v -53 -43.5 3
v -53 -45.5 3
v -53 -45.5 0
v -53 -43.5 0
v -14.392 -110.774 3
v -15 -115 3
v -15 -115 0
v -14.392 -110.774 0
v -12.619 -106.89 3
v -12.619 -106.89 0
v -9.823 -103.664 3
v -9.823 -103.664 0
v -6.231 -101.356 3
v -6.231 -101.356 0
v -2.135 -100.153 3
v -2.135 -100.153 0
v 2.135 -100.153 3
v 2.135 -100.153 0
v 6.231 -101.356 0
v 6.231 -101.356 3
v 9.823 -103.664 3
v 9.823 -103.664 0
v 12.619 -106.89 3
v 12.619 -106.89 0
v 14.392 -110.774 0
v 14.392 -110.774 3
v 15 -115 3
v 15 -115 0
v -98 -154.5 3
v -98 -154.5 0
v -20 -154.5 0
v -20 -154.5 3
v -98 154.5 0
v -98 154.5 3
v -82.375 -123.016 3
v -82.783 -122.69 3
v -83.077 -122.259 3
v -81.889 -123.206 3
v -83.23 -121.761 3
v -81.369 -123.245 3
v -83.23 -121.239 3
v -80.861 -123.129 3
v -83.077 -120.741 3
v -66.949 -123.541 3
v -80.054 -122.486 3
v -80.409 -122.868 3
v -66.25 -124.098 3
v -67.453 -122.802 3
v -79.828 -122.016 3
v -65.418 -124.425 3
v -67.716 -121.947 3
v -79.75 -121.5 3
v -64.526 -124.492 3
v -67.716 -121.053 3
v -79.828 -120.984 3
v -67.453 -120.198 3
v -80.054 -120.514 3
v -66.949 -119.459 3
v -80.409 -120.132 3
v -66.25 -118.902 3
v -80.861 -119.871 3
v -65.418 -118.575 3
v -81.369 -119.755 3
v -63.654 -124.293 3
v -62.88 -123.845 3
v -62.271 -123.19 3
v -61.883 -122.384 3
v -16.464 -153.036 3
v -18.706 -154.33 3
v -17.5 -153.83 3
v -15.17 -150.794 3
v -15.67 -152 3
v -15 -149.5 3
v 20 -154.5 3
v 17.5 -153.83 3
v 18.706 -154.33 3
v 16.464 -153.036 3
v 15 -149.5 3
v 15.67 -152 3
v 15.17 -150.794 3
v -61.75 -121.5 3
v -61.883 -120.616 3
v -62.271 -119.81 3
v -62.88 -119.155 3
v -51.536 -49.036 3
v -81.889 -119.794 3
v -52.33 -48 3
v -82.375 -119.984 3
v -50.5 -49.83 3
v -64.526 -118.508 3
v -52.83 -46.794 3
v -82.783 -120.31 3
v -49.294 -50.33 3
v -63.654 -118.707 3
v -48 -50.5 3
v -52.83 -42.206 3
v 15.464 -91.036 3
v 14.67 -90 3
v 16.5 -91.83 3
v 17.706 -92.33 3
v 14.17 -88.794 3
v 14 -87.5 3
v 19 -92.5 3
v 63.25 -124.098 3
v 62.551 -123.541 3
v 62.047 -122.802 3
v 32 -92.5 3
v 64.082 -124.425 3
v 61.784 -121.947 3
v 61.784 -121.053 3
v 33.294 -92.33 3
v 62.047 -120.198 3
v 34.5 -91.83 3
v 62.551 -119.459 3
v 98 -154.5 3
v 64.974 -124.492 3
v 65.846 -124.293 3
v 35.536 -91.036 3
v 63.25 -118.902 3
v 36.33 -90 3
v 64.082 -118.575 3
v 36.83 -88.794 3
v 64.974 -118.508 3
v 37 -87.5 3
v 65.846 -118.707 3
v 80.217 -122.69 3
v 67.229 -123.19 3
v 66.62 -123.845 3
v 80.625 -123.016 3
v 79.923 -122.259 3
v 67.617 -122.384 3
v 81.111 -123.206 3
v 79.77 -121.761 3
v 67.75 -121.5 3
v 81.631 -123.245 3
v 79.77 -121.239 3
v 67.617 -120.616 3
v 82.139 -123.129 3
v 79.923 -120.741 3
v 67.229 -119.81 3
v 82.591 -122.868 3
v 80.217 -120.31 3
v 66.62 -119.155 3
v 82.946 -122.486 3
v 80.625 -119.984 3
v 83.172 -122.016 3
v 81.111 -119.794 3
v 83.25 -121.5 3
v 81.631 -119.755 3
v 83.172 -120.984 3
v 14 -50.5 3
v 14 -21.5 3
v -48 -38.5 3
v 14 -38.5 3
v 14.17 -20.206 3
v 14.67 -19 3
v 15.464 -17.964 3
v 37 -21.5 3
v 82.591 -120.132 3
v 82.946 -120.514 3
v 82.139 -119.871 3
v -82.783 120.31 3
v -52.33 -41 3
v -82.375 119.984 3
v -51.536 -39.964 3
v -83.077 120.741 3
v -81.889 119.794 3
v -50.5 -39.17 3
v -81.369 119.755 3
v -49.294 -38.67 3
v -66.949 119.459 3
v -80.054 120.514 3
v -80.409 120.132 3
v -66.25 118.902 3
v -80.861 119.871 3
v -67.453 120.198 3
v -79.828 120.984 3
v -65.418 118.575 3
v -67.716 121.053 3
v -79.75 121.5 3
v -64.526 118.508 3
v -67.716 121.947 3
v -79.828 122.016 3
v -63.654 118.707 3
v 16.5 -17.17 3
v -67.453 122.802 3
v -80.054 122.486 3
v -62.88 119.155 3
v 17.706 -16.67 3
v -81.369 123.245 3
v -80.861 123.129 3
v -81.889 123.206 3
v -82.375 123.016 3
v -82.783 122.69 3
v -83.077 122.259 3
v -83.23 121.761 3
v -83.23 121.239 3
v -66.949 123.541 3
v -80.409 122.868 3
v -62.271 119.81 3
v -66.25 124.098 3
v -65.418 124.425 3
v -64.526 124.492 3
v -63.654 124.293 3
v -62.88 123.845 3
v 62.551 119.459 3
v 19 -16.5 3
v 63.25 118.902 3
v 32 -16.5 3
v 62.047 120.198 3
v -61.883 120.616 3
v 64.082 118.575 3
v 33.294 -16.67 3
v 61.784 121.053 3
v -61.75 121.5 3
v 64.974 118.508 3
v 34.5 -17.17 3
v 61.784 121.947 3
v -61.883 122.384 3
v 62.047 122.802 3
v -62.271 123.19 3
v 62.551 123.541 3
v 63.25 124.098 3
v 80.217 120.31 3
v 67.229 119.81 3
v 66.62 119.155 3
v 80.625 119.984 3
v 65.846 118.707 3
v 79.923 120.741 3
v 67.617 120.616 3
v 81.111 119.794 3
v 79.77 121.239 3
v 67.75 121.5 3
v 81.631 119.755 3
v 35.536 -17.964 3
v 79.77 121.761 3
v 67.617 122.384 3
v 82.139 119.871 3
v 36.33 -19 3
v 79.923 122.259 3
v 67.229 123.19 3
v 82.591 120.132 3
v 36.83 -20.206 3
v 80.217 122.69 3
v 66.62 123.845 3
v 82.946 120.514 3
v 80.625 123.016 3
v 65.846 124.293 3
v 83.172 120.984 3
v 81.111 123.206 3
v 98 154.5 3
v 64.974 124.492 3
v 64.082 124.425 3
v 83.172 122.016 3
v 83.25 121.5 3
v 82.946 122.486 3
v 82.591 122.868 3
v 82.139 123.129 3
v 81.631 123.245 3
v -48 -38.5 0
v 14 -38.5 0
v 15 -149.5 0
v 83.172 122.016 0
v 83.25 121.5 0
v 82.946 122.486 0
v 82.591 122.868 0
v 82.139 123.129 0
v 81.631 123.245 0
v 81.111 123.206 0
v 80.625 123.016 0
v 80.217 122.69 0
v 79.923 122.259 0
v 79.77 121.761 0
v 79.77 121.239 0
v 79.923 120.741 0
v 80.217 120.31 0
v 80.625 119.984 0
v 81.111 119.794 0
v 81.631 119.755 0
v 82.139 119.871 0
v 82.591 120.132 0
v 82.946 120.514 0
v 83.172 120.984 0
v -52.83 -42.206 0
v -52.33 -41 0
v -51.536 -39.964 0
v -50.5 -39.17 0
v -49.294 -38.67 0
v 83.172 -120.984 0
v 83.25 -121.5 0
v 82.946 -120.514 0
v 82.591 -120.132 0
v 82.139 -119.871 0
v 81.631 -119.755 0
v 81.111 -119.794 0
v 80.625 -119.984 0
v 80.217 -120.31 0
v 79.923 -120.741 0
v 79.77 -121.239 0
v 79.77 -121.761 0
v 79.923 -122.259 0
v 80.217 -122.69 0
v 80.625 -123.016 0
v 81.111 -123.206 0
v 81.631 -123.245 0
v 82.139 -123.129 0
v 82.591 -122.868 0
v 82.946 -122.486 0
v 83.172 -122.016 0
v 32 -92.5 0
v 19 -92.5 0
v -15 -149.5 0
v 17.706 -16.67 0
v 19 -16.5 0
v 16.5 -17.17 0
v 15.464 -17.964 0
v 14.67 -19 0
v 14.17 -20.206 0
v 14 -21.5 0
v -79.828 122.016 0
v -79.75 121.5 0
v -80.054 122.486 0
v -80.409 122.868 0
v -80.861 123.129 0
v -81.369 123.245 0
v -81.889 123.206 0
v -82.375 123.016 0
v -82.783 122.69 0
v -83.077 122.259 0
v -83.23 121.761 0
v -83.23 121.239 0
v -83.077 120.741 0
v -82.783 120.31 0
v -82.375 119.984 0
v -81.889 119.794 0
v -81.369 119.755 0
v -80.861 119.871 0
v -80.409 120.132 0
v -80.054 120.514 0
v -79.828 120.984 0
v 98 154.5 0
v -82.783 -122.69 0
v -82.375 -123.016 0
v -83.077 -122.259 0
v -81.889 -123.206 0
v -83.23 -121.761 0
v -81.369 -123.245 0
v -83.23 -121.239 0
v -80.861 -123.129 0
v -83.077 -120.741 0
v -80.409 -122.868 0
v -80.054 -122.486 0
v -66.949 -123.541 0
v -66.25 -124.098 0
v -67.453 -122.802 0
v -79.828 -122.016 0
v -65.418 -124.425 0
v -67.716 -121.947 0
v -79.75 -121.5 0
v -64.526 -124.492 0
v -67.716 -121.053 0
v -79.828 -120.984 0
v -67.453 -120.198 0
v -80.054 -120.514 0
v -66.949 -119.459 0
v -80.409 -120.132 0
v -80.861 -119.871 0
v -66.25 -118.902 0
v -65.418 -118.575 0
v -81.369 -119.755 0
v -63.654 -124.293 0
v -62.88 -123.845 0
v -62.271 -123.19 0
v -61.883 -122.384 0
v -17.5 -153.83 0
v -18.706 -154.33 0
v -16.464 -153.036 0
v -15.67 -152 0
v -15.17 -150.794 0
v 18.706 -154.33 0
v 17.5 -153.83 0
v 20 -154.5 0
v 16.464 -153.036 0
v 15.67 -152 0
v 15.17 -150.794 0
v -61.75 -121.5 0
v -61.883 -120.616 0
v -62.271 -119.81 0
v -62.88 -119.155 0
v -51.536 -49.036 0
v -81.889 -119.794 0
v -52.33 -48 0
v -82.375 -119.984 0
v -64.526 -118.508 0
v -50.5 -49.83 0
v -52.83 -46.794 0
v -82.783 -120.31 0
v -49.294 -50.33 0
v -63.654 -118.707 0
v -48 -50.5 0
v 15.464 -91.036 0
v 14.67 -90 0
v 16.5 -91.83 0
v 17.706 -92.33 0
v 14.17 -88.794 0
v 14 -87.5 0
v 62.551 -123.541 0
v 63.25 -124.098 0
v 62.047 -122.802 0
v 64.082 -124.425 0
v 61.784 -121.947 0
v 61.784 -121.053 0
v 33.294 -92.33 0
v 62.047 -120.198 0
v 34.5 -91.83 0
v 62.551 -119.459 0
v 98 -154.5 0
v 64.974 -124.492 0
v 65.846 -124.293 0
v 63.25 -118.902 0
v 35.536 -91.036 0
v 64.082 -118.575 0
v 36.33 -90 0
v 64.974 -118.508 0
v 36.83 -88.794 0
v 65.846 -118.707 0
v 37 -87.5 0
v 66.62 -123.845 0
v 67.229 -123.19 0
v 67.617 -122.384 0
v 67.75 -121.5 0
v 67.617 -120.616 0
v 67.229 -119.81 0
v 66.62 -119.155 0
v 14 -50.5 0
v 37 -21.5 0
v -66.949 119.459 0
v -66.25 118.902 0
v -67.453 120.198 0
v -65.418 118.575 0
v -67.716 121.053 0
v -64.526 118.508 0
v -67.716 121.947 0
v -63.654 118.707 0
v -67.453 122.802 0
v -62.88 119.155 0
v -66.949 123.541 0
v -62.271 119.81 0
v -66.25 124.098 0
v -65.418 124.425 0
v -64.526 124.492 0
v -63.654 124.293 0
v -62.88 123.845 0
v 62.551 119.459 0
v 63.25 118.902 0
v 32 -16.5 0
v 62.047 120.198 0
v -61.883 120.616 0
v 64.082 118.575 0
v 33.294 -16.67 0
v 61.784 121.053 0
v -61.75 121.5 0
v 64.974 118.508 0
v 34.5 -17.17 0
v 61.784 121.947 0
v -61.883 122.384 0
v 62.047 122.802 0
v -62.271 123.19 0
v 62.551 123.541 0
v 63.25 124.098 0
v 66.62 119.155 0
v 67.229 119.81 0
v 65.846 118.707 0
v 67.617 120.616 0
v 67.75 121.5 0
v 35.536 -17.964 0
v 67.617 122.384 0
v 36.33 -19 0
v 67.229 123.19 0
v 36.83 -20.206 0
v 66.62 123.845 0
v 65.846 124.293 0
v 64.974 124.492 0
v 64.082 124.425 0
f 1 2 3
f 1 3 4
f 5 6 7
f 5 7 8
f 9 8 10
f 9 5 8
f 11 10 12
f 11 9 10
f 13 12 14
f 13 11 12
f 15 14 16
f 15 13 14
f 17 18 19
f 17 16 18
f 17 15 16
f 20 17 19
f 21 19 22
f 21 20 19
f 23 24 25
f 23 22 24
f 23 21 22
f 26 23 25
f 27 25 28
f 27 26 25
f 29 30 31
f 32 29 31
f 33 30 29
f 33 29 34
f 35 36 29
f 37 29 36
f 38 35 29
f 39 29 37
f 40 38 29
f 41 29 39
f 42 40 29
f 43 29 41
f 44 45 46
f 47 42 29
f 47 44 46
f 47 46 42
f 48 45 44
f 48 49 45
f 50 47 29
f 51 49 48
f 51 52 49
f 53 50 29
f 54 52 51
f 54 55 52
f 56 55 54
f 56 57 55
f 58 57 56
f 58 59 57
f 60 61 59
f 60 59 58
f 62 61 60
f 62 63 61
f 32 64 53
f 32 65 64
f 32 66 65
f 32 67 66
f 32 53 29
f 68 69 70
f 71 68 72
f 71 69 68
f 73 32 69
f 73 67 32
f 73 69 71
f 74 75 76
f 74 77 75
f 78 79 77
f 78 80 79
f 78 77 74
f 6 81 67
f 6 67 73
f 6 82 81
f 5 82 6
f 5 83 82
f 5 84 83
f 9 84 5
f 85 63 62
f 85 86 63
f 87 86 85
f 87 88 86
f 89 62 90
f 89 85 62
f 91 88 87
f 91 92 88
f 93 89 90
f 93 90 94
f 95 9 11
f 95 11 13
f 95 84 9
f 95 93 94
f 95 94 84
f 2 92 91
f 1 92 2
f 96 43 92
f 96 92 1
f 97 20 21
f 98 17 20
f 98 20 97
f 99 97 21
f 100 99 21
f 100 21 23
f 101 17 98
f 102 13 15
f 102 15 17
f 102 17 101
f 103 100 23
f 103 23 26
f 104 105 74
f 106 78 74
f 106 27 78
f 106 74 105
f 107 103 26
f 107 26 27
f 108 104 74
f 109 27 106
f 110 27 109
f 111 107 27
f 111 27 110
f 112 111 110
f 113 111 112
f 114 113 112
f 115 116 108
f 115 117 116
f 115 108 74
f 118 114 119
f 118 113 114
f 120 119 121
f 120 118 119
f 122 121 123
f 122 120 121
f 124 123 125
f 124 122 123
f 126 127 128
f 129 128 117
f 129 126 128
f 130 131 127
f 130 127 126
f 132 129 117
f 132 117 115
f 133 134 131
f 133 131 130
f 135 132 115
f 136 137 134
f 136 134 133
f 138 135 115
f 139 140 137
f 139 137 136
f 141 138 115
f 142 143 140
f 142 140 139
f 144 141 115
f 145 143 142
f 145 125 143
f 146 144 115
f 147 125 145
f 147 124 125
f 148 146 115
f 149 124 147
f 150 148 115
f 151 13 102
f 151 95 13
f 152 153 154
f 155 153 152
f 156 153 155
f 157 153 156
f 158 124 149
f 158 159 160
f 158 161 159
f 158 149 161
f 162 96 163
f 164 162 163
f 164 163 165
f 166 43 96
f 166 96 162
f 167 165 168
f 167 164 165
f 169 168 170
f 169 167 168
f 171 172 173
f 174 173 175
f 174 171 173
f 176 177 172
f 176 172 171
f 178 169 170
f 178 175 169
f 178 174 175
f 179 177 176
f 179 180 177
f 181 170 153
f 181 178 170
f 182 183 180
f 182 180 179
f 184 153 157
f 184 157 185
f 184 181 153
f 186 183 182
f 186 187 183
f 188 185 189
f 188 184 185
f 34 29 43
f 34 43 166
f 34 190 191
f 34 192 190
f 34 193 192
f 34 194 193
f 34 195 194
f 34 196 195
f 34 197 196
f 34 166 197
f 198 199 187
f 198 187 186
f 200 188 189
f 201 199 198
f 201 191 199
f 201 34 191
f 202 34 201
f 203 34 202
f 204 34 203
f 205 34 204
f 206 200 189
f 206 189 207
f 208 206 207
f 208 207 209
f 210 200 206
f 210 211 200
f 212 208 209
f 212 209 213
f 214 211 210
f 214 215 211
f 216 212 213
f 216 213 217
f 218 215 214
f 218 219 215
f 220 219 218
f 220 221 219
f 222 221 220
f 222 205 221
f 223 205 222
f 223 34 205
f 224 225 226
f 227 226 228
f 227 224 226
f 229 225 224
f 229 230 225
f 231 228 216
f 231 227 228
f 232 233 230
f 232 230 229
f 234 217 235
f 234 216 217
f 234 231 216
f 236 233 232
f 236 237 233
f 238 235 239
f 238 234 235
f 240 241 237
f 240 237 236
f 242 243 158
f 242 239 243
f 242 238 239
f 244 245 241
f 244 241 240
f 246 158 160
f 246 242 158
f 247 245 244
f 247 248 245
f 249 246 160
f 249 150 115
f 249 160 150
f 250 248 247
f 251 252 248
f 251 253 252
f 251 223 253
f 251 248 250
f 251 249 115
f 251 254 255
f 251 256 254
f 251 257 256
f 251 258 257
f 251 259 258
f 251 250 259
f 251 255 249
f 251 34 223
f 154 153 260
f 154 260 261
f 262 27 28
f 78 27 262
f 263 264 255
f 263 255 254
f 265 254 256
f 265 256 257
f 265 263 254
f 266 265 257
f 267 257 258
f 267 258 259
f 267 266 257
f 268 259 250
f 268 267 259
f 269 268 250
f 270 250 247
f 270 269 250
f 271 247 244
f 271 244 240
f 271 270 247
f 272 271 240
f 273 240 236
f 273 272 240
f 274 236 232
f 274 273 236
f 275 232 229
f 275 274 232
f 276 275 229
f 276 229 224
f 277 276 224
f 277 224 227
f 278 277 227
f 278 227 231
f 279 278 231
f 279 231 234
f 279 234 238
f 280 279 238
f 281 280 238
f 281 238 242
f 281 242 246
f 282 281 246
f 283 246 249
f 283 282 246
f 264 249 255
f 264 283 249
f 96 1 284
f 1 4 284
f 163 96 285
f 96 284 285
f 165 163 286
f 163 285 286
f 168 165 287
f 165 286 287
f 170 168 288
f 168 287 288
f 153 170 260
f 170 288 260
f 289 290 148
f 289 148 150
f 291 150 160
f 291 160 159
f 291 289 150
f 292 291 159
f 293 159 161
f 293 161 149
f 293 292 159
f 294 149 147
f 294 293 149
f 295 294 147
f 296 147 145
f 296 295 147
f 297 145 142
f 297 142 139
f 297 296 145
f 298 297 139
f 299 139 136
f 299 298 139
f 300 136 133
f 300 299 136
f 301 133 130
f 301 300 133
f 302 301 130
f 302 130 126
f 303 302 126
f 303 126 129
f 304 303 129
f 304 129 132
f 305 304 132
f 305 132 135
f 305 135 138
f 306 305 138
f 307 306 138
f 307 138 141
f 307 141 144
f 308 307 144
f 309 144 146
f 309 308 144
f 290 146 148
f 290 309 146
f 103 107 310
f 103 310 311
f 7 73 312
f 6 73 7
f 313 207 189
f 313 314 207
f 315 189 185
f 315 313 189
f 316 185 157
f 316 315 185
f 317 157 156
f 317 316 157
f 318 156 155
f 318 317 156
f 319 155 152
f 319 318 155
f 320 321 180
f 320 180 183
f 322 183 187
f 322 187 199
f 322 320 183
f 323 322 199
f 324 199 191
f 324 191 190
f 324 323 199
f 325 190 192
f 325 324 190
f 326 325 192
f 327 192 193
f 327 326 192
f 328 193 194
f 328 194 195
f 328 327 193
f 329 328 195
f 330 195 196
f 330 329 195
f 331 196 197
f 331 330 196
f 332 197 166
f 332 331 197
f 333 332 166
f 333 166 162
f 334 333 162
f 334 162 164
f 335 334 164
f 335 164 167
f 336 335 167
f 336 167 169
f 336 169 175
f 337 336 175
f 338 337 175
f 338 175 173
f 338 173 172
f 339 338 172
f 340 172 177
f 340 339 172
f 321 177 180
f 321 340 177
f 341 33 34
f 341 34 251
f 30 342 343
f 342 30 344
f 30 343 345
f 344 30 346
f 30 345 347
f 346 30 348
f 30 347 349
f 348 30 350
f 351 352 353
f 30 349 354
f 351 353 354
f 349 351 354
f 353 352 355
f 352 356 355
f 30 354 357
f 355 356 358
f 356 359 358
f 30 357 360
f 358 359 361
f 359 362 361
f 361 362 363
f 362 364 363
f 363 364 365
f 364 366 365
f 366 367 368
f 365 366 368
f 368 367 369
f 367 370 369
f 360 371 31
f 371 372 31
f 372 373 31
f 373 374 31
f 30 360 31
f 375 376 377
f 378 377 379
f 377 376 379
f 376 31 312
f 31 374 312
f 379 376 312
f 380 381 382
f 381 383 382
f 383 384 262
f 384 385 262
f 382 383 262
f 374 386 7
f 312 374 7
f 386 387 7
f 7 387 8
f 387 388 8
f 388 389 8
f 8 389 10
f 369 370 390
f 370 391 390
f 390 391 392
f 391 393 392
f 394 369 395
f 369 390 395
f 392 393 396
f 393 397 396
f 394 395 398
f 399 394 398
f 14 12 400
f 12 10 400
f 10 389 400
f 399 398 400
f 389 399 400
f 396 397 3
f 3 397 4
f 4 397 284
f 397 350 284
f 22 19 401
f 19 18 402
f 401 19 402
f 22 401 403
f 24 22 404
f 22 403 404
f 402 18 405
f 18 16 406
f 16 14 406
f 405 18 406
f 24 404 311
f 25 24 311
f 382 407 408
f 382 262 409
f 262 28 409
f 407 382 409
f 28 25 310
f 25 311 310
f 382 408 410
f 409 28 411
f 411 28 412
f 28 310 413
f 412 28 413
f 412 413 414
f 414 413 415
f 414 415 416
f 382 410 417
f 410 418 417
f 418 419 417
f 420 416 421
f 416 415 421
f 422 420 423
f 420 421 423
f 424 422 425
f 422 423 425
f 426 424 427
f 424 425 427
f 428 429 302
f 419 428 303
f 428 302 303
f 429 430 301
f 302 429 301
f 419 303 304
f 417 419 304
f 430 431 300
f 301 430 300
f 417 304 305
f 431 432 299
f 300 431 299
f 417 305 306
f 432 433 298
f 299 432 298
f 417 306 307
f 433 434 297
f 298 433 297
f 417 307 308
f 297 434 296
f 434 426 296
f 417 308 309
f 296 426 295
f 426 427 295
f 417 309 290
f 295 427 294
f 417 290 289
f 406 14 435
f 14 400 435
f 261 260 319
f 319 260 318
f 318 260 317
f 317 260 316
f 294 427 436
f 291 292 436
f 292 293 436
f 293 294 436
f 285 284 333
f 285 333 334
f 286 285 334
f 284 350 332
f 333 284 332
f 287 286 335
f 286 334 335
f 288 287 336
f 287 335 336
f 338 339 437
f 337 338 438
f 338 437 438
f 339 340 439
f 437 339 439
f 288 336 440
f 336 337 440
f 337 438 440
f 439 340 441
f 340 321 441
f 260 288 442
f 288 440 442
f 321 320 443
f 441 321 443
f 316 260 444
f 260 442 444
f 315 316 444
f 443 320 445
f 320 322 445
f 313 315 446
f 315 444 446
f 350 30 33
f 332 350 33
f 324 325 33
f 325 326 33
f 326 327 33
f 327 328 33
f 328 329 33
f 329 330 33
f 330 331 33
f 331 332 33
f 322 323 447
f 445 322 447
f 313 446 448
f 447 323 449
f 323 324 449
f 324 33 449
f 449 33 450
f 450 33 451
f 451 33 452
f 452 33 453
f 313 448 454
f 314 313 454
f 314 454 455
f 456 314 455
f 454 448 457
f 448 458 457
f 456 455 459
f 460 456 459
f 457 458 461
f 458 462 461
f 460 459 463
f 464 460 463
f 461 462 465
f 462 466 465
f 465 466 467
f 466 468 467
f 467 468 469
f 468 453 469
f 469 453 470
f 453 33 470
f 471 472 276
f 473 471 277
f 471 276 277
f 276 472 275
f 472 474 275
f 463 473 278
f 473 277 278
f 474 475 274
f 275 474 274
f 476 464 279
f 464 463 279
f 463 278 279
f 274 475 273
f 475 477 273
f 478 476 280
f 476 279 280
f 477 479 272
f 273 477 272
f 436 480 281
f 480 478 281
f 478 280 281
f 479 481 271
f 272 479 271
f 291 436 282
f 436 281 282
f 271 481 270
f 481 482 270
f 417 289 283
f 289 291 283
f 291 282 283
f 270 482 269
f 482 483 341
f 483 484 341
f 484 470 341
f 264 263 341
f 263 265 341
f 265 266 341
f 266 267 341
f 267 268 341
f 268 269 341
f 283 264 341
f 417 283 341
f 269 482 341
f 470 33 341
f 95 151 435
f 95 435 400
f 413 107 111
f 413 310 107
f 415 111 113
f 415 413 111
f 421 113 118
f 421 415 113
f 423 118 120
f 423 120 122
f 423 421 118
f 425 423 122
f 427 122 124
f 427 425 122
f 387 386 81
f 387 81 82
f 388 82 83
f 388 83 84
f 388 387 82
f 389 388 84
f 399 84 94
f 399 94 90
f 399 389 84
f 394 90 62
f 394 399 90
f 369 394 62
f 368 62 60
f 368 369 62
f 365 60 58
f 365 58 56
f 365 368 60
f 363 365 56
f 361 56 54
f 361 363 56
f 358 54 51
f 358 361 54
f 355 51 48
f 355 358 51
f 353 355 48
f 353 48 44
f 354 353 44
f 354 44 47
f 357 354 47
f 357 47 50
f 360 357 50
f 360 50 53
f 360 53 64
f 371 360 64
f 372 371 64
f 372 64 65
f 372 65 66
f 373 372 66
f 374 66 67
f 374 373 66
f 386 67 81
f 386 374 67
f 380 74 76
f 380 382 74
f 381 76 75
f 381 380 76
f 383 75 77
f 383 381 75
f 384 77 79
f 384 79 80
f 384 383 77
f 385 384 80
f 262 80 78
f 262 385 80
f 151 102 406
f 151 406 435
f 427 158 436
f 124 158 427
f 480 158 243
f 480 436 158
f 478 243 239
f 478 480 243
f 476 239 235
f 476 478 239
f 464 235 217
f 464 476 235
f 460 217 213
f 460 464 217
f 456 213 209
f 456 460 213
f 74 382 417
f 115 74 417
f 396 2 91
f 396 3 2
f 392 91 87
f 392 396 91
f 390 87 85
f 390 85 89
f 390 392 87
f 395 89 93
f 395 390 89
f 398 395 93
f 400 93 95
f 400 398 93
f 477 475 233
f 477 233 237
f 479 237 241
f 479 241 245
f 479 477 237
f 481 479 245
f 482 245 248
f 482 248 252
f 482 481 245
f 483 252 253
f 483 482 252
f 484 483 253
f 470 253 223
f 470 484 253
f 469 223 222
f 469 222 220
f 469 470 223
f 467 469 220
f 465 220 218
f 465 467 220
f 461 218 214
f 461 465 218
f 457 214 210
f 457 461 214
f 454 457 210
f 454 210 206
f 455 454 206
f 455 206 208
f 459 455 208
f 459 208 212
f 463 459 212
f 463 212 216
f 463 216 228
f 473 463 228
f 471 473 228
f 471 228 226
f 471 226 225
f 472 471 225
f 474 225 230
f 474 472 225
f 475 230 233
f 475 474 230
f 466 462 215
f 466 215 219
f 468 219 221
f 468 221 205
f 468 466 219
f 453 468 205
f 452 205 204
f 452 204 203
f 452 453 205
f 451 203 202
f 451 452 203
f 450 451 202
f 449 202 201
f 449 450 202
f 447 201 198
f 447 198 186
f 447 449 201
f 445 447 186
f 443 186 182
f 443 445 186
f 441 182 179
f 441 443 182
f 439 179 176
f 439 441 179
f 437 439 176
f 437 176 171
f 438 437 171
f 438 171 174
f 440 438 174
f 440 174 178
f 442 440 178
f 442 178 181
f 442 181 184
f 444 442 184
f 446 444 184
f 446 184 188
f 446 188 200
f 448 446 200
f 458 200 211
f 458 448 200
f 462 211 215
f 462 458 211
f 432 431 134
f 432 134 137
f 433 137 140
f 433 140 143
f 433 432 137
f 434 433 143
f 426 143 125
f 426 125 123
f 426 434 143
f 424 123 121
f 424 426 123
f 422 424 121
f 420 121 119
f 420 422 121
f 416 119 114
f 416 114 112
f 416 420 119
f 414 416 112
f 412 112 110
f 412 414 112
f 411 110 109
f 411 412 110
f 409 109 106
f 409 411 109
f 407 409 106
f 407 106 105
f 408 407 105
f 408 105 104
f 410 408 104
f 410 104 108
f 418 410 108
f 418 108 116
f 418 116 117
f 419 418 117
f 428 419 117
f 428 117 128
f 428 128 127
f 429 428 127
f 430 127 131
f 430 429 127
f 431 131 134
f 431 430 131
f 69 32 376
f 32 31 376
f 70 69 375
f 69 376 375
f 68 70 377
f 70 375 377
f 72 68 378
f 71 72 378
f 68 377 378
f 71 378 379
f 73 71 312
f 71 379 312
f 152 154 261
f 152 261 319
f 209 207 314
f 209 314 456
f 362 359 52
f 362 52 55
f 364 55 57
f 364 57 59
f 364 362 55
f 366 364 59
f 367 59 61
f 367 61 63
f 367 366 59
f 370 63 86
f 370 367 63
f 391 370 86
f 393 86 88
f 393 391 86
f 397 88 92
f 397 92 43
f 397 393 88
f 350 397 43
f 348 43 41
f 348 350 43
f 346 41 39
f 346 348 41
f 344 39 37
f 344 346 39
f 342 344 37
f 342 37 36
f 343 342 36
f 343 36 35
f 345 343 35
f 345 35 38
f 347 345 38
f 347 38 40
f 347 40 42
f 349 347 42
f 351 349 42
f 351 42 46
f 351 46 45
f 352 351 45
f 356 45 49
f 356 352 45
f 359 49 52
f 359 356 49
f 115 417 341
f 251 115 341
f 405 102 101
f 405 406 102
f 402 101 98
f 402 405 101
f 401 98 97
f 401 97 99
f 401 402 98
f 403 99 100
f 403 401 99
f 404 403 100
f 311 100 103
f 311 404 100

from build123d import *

# Parameters (mm, degrees)
ESQUISSE1_W             = 196
ESQUISSE1_H             = 309
ESQUISSE1_R             = 1.75
ESQUISSE1_R_2           = 3
BOSS_EXTRU_1_DEPTH      = 3
ENL_V_MAT_EXTRU_1_REACH = 5
CONG_1_R                = 5
ENL_V_MAT_EXTRU_2_DEPTH = 4
CONG_2_R                = 5


with BuildPart() as part:
    # Esquisse1 → Boss.-Extru.1 (new body)
    with BuildSketch(Plane.XY):
        Rectangle(ESQUISSE1_W, ESQUISSE1_H)
        with Locations((-81.5, 121.5)):
            Circle(ESQUISSE1_R, mode=Mode.SUBTRACT)
        with Locations((81.5, 121.5)):
            Circle(ESQUISSE1_R, mode=Mode.SUBTRACT)
        with Locations((81.5, -121.5)):
            Circle(ESQUISSE1_R, mode=Mode.SUBTRACT)
        with Locations((-81.5, -121.5)):
            Circle(ESQUISSE1_R, mode=Mode.SUBTRACT)
        with Locations((64.75, 121.5)):
            Circle(ESQUISSE1_R_2, mode=Mode.SUBTRACT)
        with Locations((-64.75, 121.5)):
            Circle(ESQUISSE1_R_2, mode=Mode.SUBTRACT)
        with Locations((-64.75, -121.5)):
            Circle(ESQUISSE1_R_2, mode=Mode.SUBTRACT)
        with Locations((64.75, -121.5)):
            Circle(ESQUISSE1_R_2, mode=Mode.SUBTRACT)
    extrude(amount=BOSS_EXTRU_1_DEPTH)

    # Esquisse2 → Enlèv. mat.-Extru.1 (cut, up to next)
    with BuildSketch(Plane.XY.offset(3), mode=Mode.PRIVATE) as enl_v_mat_extru_1_sk1:
        with BuildLine():
            Line((-15, -154.5), (-15, -115))
            ThreePointArc((-15, -115), (0, -100), (15, -115))
            Line((15, -115), (15, -154.5))
            ThreePointArc((15, -154.5), (0, -169.5), (-15, -154.5))
        make_face()
    enl_v_mat_extru_1_tool1 = extrude(enl_v_mat_extru_1_sk1.sketch, amount=-ENL_V_MAT_EXTRU_1_REACH, mode=Mode.PRIVATE) & part.part
    add(enl_v_mat_extru_1_tool1.solids().sort_by_distance((0, -134.75, 3))[0], mode=Mode.SUBTRACT)

    # Congé1
    cong_1_edges = [part.edges().sort_by_distance(p)[0] for p in [
        (-15, -154.5, 1.5),
        (15, -154.5, 1.5),
    ]]
    fillet(cong_1_edges, radius=CONG_1_R)

    # Esquisse3 → Enlèv. mat.-Extru.2 (cut, through all)
    with BuildSketch(Plane.XY.offset(3)):
        Polygon((-53, -38.5), (14, -38.5), (14, -16.5), (37, -16.5), (37, -92.5), (14, -92.5), (14, -50.5), (-53, -50.5), align=None)
    extrude(amount=-ENL_V_MAT_EXTRU_2_DEPTH, mode=Mode.SUBTRACT)

    # Congé2
    cong_2_edges = [part.edges().sort_by_distance(p)[0] for p in [
        (-53, -50.5, 1.5),
        (-53, -38.5, 1.5),
        (14, -16.5, 1.5),
        (37, -16.5, 1.5),
        (37, -92.5, 1.5),
        (14, -92.5, 1.5),
    ]]
    fillet(cong_2_edges, radius=CONG_2_R)


solid = part.part
